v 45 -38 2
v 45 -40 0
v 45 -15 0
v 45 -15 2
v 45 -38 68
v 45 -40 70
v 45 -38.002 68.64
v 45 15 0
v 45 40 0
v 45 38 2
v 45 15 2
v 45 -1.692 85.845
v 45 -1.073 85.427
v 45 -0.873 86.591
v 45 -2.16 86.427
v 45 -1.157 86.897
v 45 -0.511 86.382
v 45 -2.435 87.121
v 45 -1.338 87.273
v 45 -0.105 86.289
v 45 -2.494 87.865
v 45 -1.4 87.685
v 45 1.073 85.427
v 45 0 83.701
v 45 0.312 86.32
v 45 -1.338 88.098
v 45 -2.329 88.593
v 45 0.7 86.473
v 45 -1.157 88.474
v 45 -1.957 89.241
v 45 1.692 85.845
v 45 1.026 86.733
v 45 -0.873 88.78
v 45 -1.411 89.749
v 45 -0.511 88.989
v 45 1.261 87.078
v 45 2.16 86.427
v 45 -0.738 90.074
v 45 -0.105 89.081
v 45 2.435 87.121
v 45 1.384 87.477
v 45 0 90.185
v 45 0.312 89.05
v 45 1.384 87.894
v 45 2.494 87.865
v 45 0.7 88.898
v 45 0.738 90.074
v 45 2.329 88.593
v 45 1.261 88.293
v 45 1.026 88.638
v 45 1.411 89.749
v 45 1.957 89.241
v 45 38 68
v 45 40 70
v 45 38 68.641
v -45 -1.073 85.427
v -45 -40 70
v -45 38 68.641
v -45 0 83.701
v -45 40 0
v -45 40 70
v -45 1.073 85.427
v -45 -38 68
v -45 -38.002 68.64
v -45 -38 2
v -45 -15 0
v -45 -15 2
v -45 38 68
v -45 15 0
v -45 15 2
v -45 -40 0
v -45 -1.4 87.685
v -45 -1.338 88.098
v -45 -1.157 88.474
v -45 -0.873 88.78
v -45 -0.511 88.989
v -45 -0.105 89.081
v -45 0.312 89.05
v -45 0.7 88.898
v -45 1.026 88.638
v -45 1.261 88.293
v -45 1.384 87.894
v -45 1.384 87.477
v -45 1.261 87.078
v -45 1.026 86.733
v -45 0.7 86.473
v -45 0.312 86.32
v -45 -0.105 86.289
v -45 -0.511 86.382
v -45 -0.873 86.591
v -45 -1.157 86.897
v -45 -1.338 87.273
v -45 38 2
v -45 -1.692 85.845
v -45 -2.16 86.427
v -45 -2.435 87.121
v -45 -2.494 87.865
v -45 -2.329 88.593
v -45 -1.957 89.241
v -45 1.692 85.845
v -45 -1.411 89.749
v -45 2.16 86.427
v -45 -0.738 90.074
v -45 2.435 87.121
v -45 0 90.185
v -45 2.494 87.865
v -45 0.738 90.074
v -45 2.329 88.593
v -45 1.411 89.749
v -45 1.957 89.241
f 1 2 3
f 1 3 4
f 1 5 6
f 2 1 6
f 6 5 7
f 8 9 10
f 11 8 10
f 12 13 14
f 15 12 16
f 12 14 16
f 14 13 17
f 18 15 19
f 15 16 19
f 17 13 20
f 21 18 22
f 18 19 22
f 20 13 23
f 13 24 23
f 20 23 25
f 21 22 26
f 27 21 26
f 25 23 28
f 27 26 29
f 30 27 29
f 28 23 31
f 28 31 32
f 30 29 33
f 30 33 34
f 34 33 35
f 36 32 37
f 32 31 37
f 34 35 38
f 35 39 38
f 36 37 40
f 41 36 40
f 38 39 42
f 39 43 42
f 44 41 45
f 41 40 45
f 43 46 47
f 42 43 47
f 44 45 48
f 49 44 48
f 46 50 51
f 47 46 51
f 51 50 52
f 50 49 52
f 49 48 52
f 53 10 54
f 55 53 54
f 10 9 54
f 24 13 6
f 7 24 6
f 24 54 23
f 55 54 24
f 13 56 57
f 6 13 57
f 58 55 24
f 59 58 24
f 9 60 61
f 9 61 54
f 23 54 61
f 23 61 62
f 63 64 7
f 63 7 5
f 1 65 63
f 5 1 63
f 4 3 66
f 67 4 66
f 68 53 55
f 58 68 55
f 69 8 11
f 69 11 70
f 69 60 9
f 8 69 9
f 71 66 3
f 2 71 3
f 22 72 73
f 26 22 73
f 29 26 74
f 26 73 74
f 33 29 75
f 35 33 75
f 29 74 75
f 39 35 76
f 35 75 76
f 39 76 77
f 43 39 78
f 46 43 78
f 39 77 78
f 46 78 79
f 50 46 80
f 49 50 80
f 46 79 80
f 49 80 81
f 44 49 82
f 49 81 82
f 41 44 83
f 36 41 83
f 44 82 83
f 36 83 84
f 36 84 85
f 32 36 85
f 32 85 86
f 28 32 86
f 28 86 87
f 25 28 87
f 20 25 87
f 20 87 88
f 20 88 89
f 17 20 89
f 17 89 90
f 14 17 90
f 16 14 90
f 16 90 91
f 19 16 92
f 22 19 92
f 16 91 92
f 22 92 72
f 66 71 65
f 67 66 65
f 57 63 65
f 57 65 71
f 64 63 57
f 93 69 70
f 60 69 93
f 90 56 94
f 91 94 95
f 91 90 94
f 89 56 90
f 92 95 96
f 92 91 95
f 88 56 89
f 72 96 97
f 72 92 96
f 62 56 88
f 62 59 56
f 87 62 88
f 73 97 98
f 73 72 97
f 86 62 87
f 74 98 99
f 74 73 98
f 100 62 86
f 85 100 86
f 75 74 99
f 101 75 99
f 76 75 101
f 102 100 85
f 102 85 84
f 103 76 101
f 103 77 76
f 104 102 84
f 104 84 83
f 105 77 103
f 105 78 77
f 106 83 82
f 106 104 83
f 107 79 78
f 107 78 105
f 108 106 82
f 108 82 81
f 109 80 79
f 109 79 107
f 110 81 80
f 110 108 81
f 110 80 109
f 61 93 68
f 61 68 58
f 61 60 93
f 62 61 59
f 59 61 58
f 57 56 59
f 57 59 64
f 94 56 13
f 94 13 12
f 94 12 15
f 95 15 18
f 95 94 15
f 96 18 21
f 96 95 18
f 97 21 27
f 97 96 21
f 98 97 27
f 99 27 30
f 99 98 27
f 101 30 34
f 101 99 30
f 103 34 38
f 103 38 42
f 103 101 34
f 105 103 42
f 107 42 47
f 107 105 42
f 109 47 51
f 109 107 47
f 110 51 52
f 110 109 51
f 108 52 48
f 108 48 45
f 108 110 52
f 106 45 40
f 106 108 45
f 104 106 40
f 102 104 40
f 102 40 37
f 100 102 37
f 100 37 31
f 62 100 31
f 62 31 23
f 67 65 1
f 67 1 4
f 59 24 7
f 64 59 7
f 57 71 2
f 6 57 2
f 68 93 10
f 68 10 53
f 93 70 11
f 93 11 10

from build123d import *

# Parameters (mm, degrees)
SKETCH1_W           = 90
SKETCH1_H           = 80
BOSS_EXTRUDE4_DEPTH = 70
BOSS_EXTRUDE5_DEPTH = 90
SKETCH9_R           = 2.5
SKETCH9_R_2         = 1.4
BOSS_EXTRUDE6_DEPTH = 90
SKETCH10_W          = 66
SKETCH10_H          = 76
CUT_EXTRUDE1_DEPTH  = 134.541756472
CUT_EXTRUDE2_DEPTH  = 134.541756472
SKETCH16_W          = 90
SKETCH16_H          = 30
CUT_EXTRUDE3_DEPTH  = 10


with BuildPart() as part:
    # Sketch1 → Boss-Extrude4 (new body)
    with BuildSketch(Plane.XY):
        Rectangle(SKETCH1_W, SKETCH1_H)
    extrude(amount=BOSS_EXTRUDE4_DEPTH)

    # Sketch8 → Boss-Extrude5 (add, through all)
    with BuildSketch(Plane.ZY.offset(45)):
        Polygon((70, 40), (85.852498999, 0), (70, -40), align=None)
    extrude(amount=-BOSS_EXTRUDE5_DEPTH)

    # Sketch9 → Boss-Extrude6 (add, through all)
    with BuildSketch(Plane.ZY.offset(45)):
        with Locations((87.685368667, 0)):
            Circle(SKETCH9_R)
        with Locations(Location((87.685368667, 0, 0), (0, 0, 270))):
            Circle(SKETCH9_R_2, mode=Mode.SUBTRACT)
    extrude(amount=-BOSS_EXTRUDE6_DEPTH)

    # Sketch10 → Cut-Extrude1 (cut, through all)
    with BuildSketch(Plane.ZY.offset(45)):
        with Locations((35, 0)):
            Rectangle(SKETCH10_W, SKETCH10_H)
    extrude(amount=-CUT_EXTRUDE1_DEPTH, mode=Mode.SUBTRACT)

    # Sketch11 → Cut-Extrude2 (cut, through all)
    with BuildSketch(Plane(origin=(45, 0, 0), x_dir=(0, 0, -1), z_dir=(1, 0, 0))):
        Polygon((-68.641168629, 38.000299069), (-83.701161204, 0), (-68.640413999, -38.002203199), (-68, -38), (-68, 38), align=None)
    extrude(amount=-CUT_EXTRUDE2_DEPTH, mode=Mode.SUBTRACT)

    # Sketch16 → Cut-Extrude3 (cut)
    with BuildSketch(Plane(origin=(0, 0, 0), x_dir=(-1, 0, 0), z_dir=(0, 0, -1))):
        Rectangle(SKETCH16_W, SKETCH16_H)
    extrude(amount=-CUT_EXTRUDE3_DEPTH, mode=Mode.SUBTRACT)


solid = part.part
